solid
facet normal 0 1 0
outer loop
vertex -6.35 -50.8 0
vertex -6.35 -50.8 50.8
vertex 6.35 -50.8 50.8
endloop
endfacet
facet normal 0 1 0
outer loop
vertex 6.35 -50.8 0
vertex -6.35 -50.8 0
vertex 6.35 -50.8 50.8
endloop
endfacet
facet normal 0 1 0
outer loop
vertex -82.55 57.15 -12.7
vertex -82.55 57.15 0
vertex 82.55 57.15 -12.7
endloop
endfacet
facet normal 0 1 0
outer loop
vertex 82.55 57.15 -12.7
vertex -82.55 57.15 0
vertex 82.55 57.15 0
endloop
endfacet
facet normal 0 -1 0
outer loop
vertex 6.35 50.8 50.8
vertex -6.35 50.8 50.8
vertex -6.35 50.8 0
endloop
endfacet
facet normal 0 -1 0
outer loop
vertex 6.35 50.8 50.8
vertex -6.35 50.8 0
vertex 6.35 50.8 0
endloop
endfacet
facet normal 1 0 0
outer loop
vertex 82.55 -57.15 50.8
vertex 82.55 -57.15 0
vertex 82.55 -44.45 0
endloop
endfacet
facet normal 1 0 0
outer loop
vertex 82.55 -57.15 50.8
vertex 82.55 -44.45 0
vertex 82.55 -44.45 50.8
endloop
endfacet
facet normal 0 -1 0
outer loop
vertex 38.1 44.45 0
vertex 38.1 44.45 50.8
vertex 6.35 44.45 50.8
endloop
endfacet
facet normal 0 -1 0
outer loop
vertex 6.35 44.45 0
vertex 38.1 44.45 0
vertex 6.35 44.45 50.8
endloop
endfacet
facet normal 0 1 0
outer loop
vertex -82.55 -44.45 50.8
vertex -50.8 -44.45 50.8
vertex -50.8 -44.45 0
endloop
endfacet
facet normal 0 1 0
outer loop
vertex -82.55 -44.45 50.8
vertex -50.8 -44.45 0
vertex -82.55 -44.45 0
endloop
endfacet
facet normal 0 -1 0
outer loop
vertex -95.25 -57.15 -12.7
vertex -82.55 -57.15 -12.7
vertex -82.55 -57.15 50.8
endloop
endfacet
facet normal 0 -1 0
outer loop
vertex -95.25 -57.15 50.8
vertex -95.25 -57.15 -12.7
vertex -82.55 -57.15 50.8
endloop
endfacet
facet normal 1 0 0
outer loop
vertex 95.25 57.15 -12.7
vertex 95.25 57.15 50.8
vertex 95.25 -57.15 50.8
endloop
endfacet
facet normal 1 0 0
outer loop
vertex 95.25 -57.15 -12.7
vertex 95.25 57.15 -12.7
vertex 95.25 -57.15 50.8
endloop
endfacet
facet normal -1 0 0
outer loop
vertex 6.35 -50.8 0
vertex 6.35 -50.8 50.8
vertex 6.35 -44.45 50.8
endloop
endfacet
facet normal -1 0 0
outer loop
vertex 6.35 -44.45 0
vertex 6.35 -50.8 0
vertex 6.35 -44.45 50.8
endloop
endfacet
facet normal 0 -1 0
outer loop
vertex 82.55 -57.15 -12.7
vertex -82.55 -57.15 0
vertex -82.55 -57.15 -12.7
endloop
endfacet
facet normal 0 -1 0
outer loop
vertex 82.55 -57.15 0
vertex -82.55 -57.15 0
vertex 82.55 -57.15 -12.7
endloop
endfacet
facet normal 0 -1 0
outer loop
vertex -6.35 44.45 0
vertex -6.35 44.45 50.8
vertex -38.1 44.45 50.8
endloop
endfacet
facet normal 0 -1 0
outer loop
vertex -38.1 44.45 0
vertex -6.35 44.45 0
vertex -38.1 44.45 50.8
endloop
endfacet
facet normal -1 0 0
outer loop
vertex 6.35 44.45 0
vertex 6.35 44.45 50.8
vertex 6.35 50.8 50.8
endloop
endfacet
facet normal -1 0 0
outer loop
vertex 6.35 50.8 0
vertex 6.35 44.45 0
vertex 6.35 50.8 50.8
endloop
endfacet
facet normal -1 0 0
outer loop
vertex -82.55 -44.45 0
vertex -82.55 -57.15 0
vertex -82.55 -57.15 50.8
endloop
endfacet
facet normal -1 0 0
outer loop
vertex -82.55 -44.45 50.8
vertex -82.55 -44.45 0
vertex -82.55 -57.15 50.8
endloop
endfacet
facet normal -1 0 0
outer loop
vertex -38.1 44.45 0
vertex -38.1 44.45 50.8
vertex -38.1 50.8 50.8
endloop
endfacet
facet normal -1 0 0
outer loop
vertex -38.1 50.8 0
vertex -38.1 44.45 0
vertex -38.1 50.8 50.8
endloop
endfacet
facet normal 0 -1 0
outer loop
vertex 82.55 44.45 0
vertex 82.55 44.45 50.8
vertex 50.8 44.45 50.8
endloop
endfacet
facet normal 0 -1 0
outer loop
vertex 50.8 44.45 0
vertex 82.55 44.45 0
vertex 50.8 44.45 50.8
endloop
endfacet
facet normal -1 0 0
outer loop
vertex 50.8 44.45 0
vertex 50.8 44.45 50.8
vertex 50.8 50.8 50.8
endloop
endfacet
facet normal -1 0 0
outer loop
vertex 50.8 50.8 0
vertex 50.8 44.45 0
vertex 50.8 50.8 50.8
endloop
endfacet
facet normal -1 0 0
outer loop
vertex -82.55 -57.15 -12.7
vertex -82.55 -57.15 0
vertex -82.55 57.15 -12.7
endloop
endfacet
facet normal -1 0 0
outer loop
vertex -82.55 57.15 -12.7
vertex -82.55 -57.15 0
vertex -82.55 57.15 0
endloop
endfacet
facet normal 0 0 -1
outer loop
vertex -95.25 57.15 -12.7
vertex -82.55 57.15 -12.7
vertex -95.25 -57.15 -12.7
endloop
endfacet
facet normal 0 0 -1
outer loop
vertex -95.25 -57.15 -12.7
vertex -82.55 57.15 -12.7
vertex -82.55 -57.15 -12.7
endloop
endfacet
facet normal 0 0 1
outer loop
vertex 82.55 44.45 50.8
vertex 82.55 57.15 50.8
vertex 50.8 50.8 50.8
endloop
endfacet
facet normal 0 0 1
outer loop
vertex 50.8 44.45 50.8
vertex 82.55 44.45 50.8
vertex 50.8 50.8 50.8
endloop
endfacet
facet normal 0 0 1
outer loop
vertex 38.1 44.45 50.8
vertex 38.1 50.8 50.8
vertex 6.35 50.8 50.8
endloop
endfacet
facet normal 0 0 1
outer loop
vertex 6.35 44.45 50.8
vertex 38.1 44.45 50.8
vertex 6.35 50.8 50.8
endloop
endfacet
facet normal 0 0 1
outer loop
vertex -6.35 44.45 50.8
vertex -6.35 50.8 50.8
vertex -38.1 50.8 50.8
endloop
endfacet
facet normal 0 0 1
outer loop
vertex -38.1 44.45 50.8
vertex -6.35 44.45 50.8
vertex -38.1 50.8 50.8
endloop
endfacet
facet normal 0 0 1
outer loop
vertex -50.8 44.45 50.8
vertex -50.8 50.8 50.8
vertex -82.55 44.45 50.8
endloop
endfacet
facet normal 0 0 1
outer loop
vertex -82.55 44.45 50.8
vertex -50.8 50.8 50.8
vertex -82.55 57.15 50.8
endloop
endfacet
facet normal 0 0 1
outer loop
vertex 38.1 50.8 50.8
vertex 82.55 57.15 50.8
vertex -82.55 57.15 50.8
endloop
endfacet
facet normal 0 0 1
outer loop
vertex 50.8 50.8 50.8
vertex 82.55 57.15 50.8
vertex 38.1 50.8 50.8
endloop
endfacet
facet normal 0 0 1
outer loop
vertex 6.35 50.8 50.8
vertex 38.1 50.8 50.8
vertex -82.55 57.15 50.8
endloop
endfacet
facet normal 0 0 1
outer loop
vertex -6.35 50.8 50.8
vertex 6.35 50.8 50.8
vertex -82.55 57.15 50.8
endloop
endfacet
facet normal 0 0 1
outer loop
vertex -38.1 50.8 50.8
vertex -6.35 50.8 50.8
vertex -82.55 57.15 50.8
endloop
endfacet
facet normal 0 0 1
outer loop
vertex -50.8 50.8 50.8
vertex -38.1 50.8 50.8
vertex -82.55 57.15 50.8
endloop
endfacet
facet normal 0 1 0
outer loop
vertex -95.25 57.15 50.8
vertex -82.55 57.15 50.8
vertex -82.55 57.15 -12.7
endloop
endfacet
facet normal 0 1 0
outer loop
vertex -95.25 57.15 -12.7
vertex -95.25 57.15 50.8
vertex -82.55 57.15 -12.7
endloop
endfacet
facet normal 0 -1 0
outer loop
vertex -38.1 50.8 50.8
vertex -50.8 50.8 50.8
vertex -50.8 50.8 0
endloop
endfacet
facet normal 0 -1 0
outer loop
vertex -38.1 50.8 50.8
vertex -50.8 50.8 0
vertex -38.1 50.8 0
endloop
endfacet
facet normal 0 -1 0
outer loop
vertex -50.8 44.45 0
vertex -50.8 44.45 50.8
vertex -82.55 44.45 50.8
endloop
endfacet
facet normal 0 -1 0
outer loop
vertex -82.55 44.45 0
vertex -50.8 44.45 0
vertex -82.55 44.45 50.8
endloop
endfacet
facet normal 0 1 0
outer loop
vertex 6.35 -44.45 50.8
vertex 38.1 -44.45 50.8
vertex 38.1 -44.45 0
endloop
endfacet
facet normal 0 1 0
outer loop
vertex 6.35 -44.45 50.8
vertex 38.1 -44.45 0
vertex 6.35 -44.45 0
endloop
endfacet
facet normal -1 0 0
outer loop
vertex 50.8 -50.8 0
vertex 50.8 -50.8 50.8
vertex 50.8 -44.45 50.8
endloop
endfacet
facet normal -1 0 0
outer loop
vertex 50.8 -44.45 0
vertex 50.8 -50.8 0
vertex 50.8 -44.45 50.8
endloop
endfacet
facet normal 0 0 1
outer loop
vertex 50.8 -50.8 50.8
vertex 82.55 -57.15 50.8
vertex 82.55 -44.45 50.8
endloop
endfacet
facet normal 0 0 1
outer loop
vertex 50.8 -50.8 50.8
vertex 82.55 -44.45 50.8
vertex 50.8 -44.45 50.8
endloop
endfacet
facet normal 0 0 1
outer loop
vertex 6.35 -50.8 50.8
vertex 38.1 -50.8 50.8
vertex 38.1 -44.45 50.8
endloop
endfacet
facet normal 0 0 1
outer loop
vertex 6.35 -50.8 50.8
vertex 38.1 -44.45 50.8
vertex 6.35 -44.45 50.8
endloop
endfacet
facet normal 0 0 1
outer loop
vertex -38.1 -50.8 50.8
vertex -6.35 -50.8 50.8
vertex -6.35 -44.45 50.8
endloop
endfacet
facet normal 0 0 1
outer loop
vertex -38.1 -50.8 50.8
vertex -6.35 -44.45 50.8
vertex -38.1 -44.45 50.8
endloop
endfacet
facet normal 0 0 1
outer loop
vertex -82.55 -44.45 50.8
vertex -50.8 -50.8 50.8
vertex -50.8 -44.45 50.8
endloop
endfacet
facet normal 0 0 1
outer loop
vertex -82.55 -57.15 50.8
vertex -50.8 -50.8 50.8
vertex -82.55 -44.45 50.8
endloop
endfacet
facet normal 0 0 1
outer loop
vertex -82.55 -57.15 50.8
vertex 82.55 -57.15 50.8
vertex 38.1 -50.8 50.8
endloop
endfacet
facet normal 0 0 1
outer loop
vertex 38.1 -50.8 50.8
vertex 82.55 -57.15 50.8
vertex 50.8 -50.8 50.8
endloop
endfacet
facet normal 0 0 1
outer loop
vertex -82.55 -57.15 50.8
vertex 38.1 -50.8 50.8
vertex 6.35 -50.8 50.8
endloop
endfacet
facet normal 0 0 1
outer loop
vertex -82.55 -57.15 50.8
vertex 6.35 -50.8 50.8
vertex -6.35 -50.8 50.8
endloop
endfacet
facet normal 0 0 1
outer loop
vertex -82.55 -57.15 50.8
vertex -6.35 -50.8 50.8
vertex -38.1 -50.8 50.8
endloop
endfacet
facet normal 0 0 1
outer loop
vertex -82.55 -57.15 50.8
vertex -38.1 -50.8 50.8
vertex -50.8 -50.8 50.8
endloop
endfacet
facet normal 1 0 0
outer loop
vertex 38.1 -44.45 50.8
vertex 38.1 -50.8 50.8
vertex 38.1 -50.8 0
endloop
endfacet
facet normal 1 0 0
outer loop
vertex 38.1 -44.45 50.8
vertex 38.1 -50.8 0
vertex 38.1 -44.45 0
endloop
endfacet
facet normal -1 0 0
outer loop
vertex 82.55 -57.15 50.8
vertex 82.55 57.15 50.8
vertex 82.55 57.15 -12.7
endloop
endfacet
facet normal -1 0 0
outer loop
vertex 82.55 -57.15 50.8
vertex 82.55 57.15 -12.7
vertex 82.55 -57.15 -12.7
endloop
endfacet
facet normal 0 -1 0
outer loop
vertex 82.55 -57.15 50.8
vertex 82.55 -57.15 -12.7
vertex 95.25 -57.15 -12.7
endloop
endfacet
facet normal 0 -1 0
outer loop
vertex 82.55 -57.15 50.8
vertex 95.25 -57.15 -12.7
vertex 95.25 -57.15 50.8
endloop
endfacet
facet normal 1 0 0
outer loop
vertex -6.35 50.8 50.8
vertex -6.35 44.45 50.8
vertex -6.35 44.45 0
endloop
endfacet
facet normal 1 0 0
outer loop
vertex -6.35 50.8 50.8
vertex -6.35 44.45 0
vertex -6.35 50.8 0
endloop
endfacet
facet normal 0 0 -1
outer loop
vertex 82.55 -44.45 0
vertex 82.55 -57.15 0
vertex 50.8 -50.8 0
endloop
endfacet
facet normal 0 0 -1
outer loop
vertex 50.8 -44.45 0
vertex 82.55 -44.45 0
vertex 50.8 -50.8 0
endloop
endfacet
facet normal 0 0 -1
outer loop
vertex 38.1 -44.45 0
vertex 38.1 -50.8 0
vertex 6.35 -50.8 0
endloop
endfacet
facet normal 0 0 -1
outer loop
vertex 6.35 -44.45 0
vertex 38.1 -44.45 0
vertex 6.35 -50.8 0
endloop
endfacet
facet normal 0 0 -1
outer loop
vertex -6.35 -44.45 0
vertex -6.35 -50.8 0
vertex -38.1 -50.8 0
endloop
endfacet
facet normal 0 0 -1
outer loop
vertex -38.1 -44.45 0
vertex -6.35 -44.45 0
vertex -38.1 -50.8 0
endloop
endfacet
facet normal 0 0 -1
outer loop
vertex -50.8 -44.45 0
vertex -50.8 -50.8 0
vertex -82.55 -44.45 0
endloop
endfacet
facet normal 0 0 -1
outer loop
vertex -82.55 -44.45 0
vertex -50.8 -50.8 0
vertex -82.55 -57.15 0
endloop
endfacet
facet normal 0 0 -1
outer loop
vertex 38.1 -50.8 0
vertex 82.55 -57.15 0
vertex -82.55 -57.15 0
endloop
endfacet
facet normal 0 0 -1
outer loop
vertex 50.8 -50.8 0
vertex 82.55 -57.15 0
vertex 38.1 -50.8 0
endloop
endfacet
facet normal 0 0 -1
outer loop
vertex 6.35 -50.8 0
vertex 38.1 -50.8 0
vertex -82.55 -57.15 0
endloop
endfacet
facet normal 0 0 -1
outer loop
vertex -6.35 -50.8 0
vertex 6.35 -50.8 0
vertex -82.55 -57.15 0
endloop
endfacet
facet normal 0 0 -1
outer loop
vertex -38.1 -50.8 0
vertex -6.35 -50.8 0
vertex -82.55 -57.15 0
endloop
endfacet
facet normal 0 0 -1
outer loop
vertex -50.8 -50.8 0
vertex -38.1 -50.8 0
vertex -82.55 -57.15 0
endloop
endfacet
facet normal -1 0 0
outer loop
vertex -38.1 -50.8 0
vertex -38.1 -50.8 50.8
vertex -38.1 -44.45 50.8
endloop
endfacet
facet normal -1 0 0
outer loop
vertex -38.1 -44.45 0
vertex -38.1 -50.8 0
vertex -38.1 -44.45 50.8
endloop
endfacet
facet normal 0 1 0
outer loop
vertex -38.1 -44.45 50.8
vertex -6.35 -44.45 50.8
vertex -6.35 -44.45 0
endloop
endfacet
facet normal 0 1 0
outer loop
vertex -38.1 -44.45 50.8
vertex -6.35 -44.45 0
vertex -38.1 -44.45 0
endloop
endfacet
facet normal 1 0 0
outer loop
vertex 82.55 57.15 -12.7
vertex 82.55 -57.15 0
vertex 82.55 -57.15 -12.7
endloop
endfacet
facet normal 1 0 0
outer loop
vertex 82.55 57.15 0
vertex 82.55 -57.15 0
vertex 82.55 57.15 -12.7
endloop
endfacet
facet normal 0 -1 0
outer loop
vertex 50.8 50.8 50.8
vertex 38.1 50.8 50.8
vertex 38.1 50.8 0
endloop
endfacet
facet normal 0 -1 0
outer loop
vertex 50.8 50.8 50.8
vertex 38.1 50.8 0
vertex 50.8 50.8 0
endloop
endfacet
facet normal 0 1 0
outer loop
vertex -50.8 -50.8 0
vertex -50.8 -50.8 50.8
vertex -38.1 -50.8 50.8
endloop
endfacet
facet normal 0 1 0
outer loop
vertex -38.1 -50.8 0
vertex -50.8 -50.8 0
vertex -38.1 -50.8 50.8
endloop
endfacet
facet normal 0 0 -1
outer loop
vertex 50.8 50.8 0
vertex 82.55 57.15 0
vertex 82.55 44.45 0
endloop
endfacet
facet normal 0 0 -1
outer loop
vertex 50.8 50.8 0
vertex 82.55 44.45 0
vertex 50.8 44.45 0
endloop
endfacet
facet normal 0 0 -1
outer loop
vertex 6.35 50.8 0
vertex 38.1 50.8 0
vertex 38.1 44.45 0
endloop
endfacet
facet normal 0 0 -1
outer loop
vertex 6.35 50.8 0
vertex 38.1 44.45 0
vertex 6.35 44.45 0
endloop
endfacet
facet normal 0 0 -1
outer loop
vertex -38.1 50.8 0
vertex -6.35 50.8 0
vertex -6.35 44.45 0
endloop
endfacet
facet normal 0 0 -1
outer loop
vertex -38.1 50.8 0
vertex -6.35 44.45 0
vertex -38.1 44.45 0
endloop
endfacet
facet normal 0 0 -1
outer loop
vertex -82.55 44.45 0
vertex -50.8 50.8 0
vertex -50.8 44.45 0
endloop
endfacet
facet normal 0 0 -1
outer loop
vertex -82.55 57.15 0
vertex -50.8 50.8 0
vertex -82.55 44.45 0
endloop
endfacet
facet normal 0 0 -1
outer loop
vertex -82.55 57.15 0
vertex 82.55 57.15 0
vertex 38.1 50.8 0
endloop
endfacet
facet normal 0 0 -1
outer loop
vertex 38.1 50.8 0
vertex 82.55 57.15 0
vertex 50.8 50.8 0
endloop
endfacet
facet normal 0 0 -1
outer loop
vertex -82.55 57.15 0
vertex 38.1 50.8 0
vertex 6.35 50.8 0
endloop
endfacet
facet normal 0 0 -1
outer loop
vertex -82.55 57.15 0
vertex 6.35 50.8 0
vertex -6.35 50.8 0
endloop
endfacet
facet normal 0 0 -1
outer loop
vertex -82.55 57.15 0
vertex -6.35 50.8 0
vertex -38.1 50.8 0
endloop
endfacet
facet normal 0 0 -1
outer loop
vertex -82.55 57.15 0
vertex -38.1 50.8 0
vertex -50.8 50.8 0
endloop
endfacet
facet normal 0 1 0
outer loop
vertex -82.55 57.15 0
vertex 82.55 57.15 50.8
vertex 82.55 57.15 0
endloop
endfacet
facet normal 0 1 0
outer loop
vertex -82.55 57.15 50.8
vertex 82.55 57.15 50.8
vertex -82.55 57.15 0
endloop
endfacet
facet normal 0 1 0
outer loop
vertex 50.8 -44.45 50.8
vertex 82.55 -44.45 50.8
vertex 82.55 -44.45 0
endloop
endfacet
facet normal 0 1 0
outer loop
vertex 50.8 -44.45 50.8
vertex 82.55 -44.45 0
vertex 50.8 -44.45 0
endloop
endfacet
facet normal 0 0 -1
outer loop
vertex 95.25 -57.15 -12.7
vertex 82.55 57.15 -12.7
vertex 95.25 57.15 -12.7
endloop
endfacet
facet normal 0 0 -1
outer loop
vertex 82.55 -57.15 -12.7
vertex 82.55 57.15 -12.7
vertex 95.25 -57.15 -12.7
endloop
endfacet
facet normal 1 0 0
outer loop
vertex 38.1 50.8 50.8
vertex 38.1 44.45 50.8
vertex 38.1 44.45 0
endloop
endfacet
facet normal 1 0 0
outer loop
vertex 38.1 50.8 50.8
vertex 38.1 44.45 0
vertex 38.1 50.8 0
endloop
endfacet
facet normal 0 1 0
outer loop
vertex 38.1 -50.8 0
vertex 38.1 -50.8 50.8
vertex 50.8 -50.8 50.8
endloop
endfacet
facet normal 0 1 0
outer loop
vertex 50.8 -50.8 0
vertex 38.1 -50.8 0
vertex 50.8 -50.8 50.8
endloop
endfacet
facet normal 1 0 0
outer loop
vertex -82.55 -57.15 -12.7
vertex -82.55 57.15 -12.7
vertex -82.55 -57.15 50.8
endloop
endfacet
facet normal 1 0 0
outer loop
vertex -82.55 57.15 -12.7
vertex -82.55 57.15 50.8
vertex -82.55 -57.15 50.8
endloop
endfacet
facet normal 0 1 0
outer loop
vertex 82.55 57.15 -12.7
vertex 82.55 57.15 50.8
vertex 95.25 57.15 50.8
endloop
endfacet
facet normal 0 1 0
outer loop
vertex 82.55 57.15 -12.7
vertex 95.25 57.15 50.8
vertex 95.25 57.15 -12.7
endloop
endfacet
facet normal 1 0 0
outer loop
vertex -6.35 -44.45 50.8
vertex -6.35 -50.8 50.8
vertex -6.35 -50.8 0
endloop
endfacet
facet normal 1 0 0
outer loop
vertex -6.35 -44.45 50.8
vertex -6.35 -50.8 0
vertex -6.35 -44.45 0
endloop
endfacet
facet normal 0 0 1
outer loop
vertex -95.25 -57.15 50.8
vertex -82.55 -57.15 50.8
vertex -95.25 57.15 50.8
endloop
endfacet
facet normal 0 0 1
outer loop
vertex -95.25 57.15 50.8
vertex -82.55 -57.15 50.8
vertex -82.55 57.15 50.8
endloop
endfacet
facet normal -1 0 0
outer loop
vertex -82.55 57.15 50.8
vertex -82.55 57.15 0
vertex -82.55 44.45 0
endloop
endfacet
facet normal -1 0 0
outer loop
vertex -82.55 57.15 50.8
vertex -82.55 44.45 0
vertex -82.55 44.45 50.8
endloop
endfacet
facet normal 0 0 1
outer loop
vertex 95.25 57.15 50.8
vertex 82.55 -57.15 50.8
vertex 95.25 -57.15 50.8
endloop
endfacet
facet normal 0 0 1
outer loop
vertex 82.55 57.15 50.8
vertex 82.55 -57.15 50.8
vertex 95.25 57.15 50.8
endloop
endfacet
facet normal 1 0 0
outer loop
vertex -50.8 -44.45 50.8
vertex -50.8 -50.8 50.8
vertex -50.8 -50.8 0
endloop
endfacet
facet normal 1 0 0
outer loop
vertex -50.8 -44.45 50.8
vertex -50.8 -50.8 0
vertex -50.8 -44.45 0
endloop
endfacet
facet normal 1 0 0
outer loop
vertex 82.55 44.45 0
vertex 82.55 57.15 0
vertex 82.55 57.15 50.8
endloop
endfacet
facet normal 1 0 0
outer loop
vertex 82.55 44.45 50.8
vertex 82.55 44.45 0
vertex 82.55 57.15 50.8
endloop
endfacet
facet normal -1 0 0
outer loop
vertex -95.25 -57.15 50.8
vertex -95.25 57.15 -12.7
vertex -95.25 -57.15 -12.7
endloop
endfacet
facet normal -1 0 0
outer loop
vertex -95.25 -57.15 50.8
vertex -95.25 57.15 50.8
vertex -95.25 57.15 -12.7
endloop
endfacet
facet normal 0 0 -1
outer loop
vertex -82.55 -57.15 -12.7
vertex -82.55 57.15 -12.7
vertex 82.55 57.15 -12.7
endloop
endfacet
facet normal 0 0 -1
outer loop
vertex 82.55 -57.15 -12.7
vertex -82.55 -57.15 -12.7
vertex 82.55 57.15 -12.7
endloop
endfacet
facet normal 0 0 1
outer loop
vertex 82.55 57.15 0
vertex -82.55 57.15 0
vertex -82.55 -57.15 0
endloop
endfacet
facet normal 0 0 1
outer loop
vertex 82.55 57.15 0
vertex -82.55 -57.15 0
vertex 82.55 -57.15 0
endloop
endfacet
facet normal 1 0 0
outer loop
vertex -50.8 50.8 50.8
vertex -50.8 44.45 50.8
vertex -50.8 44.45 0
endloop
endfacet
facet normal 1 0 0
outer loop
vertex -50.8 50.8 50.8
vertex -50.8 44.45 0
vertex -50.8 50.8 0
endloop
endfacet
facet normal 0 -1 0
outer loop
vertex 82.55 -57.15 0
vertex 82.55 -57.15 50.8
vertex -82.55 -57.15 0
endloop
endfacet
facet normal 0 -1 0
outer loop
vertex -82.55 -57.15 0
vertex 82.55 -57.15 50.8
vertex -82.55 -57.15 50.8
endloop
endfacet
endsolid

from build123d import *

# Parameters (mm, degrees)
F2_W      = 165.1
F2_H      = 50.8
F3_DEPTH  = 12.7
F0_W      = 165.1
F0_H      = 114.3
F4_DEPTH  = 12.7
F6_W      = 165.1
F6_H      = 50.8
F7_DEPTH  = 12.7
F9_W      = 88.9
F9_H      = 50.8
F9_W_2    = 12.7
F10_DEPTH = 12.7
F12_W     = 88.9
F12_H     = 50.8
F12_W_2   = 12.7
F13_DEPTH = 12.7
F14_W     = 12.7
F14_H     = 6.35
F15_DEPTH = 63.5
F16_W     = 12.7
F16_H     = 6.35
F17_DEPTH = 63.5


with BuildPart() as f3:
    # F2 (on line) → F3 (new body)
    with BuildSketch(Plane(origin=(0, 57.15, 0), x_dir=(-1, 0, 0), z_dir=(0, 1, 0))):
        with Locations((0, 25.4)):
            Rectangle(F2_W, F2_H)
    extrude(amount=-F3_DEPTH)

    # F14 (on face) → F15 (cut)
    with BuildSketch(Plane.XY.offset(50.8)):
        with Locations((-44.45, 47.625)):
            Rectangle(F14_W, F14_H)
        with Locations((0, 47.625)):
            Rectangle(F14_W, F14_H)
        with Locations((44.45, 47.625)):
            Rectangle(F14_W, F14_H)
    extrude(amount=-F15_DEPTH, mode=Mode.SUBTRACT)


with BuildPart() as f4:
    # F0 (on Top) → F4 (new body)
    with BuildSketch(Plane.XY):
        Rectangle(F0_W, F0_H)
    extrude(amount=-F4_DEPTH)


with BuildPart() as f7:
    # F6 (on face) → F7 (new body)
    with BuildSketch(Plane(origin=(0, -57.15, 0), x_dir=(-1, 0, 0), z_dir=(0, 1, 0))):
        with Locations((0, 25.4)):
            Rectangle(F6_W, F6_H)
    extrude(amount=F7_DEPTH)

    # F16 (on face) → F17 (cut)
    with BuildSketch(Plane.XY.offset(50.8)):
        with Locations((44.45, -47.625)):
            Rectangle(F16_W, F16_H)
        with Locations((0, -47.625)):
            Rectangle(F16_W, F16_H)
        with Locations((-44.45, -47.625)):
            Rectangle(F16_W, F16_H)
    extrude(amount=-F17_DEPTH, mode=Mode.SUBTRACT)


with BuildPart() as f10:
    # F9 (on face) → F10 (new body)
    with BuildSketch(Plane(origin=(82.55, 0, 0), x_dir=(0, -1, 0), z_dir=(-1, 0, 0))):
        with Locations((0, 25.4)):
            Rectangle(F9_W, F9_H)
        with Locations((50.8, 25.4)):
            Rectangle(F9_W_2, F9_H)
        with Locations((-50.8, 25.4)):
            Rectangle(F9_W_2, F9_H)
        Polygon((57.15, -12.7), (57.15, 0), (44.45, 0), (-44.45, 0), (-57.15, 0), (-57.15, -12.7), align=None)
    extrude(amount=-F10_DEPTH)


with BuildPart() as f13:
    # F12 (on face) → F13 (new body)
    with BuildSketch(Plane(origin=(-82.55, 0, 0), x_dir=(0, -1, 0), z_dir=(-1, 0, 0))):
        with Locations((0, 25.4)):
            Rectangle(F12_W, F12_H)
        with Locations((50.8, 25.4)):
            Rectangle(F12_W_2, F12_H)
        Polygon((-44.45, 0), (-57.15, 0), (-57.15, -12.7), (57.15, -12.7), (57.15, 0), (44.45, 0), align=None)
        with Locations((-50.8, 25.4)):
            Rectangle(F12_W_2, F12_H)
    extrude(amount=F13_DEPTH)


solid = Compound([f3.part, f4.part, f7.part, f10.part, f13.part])
